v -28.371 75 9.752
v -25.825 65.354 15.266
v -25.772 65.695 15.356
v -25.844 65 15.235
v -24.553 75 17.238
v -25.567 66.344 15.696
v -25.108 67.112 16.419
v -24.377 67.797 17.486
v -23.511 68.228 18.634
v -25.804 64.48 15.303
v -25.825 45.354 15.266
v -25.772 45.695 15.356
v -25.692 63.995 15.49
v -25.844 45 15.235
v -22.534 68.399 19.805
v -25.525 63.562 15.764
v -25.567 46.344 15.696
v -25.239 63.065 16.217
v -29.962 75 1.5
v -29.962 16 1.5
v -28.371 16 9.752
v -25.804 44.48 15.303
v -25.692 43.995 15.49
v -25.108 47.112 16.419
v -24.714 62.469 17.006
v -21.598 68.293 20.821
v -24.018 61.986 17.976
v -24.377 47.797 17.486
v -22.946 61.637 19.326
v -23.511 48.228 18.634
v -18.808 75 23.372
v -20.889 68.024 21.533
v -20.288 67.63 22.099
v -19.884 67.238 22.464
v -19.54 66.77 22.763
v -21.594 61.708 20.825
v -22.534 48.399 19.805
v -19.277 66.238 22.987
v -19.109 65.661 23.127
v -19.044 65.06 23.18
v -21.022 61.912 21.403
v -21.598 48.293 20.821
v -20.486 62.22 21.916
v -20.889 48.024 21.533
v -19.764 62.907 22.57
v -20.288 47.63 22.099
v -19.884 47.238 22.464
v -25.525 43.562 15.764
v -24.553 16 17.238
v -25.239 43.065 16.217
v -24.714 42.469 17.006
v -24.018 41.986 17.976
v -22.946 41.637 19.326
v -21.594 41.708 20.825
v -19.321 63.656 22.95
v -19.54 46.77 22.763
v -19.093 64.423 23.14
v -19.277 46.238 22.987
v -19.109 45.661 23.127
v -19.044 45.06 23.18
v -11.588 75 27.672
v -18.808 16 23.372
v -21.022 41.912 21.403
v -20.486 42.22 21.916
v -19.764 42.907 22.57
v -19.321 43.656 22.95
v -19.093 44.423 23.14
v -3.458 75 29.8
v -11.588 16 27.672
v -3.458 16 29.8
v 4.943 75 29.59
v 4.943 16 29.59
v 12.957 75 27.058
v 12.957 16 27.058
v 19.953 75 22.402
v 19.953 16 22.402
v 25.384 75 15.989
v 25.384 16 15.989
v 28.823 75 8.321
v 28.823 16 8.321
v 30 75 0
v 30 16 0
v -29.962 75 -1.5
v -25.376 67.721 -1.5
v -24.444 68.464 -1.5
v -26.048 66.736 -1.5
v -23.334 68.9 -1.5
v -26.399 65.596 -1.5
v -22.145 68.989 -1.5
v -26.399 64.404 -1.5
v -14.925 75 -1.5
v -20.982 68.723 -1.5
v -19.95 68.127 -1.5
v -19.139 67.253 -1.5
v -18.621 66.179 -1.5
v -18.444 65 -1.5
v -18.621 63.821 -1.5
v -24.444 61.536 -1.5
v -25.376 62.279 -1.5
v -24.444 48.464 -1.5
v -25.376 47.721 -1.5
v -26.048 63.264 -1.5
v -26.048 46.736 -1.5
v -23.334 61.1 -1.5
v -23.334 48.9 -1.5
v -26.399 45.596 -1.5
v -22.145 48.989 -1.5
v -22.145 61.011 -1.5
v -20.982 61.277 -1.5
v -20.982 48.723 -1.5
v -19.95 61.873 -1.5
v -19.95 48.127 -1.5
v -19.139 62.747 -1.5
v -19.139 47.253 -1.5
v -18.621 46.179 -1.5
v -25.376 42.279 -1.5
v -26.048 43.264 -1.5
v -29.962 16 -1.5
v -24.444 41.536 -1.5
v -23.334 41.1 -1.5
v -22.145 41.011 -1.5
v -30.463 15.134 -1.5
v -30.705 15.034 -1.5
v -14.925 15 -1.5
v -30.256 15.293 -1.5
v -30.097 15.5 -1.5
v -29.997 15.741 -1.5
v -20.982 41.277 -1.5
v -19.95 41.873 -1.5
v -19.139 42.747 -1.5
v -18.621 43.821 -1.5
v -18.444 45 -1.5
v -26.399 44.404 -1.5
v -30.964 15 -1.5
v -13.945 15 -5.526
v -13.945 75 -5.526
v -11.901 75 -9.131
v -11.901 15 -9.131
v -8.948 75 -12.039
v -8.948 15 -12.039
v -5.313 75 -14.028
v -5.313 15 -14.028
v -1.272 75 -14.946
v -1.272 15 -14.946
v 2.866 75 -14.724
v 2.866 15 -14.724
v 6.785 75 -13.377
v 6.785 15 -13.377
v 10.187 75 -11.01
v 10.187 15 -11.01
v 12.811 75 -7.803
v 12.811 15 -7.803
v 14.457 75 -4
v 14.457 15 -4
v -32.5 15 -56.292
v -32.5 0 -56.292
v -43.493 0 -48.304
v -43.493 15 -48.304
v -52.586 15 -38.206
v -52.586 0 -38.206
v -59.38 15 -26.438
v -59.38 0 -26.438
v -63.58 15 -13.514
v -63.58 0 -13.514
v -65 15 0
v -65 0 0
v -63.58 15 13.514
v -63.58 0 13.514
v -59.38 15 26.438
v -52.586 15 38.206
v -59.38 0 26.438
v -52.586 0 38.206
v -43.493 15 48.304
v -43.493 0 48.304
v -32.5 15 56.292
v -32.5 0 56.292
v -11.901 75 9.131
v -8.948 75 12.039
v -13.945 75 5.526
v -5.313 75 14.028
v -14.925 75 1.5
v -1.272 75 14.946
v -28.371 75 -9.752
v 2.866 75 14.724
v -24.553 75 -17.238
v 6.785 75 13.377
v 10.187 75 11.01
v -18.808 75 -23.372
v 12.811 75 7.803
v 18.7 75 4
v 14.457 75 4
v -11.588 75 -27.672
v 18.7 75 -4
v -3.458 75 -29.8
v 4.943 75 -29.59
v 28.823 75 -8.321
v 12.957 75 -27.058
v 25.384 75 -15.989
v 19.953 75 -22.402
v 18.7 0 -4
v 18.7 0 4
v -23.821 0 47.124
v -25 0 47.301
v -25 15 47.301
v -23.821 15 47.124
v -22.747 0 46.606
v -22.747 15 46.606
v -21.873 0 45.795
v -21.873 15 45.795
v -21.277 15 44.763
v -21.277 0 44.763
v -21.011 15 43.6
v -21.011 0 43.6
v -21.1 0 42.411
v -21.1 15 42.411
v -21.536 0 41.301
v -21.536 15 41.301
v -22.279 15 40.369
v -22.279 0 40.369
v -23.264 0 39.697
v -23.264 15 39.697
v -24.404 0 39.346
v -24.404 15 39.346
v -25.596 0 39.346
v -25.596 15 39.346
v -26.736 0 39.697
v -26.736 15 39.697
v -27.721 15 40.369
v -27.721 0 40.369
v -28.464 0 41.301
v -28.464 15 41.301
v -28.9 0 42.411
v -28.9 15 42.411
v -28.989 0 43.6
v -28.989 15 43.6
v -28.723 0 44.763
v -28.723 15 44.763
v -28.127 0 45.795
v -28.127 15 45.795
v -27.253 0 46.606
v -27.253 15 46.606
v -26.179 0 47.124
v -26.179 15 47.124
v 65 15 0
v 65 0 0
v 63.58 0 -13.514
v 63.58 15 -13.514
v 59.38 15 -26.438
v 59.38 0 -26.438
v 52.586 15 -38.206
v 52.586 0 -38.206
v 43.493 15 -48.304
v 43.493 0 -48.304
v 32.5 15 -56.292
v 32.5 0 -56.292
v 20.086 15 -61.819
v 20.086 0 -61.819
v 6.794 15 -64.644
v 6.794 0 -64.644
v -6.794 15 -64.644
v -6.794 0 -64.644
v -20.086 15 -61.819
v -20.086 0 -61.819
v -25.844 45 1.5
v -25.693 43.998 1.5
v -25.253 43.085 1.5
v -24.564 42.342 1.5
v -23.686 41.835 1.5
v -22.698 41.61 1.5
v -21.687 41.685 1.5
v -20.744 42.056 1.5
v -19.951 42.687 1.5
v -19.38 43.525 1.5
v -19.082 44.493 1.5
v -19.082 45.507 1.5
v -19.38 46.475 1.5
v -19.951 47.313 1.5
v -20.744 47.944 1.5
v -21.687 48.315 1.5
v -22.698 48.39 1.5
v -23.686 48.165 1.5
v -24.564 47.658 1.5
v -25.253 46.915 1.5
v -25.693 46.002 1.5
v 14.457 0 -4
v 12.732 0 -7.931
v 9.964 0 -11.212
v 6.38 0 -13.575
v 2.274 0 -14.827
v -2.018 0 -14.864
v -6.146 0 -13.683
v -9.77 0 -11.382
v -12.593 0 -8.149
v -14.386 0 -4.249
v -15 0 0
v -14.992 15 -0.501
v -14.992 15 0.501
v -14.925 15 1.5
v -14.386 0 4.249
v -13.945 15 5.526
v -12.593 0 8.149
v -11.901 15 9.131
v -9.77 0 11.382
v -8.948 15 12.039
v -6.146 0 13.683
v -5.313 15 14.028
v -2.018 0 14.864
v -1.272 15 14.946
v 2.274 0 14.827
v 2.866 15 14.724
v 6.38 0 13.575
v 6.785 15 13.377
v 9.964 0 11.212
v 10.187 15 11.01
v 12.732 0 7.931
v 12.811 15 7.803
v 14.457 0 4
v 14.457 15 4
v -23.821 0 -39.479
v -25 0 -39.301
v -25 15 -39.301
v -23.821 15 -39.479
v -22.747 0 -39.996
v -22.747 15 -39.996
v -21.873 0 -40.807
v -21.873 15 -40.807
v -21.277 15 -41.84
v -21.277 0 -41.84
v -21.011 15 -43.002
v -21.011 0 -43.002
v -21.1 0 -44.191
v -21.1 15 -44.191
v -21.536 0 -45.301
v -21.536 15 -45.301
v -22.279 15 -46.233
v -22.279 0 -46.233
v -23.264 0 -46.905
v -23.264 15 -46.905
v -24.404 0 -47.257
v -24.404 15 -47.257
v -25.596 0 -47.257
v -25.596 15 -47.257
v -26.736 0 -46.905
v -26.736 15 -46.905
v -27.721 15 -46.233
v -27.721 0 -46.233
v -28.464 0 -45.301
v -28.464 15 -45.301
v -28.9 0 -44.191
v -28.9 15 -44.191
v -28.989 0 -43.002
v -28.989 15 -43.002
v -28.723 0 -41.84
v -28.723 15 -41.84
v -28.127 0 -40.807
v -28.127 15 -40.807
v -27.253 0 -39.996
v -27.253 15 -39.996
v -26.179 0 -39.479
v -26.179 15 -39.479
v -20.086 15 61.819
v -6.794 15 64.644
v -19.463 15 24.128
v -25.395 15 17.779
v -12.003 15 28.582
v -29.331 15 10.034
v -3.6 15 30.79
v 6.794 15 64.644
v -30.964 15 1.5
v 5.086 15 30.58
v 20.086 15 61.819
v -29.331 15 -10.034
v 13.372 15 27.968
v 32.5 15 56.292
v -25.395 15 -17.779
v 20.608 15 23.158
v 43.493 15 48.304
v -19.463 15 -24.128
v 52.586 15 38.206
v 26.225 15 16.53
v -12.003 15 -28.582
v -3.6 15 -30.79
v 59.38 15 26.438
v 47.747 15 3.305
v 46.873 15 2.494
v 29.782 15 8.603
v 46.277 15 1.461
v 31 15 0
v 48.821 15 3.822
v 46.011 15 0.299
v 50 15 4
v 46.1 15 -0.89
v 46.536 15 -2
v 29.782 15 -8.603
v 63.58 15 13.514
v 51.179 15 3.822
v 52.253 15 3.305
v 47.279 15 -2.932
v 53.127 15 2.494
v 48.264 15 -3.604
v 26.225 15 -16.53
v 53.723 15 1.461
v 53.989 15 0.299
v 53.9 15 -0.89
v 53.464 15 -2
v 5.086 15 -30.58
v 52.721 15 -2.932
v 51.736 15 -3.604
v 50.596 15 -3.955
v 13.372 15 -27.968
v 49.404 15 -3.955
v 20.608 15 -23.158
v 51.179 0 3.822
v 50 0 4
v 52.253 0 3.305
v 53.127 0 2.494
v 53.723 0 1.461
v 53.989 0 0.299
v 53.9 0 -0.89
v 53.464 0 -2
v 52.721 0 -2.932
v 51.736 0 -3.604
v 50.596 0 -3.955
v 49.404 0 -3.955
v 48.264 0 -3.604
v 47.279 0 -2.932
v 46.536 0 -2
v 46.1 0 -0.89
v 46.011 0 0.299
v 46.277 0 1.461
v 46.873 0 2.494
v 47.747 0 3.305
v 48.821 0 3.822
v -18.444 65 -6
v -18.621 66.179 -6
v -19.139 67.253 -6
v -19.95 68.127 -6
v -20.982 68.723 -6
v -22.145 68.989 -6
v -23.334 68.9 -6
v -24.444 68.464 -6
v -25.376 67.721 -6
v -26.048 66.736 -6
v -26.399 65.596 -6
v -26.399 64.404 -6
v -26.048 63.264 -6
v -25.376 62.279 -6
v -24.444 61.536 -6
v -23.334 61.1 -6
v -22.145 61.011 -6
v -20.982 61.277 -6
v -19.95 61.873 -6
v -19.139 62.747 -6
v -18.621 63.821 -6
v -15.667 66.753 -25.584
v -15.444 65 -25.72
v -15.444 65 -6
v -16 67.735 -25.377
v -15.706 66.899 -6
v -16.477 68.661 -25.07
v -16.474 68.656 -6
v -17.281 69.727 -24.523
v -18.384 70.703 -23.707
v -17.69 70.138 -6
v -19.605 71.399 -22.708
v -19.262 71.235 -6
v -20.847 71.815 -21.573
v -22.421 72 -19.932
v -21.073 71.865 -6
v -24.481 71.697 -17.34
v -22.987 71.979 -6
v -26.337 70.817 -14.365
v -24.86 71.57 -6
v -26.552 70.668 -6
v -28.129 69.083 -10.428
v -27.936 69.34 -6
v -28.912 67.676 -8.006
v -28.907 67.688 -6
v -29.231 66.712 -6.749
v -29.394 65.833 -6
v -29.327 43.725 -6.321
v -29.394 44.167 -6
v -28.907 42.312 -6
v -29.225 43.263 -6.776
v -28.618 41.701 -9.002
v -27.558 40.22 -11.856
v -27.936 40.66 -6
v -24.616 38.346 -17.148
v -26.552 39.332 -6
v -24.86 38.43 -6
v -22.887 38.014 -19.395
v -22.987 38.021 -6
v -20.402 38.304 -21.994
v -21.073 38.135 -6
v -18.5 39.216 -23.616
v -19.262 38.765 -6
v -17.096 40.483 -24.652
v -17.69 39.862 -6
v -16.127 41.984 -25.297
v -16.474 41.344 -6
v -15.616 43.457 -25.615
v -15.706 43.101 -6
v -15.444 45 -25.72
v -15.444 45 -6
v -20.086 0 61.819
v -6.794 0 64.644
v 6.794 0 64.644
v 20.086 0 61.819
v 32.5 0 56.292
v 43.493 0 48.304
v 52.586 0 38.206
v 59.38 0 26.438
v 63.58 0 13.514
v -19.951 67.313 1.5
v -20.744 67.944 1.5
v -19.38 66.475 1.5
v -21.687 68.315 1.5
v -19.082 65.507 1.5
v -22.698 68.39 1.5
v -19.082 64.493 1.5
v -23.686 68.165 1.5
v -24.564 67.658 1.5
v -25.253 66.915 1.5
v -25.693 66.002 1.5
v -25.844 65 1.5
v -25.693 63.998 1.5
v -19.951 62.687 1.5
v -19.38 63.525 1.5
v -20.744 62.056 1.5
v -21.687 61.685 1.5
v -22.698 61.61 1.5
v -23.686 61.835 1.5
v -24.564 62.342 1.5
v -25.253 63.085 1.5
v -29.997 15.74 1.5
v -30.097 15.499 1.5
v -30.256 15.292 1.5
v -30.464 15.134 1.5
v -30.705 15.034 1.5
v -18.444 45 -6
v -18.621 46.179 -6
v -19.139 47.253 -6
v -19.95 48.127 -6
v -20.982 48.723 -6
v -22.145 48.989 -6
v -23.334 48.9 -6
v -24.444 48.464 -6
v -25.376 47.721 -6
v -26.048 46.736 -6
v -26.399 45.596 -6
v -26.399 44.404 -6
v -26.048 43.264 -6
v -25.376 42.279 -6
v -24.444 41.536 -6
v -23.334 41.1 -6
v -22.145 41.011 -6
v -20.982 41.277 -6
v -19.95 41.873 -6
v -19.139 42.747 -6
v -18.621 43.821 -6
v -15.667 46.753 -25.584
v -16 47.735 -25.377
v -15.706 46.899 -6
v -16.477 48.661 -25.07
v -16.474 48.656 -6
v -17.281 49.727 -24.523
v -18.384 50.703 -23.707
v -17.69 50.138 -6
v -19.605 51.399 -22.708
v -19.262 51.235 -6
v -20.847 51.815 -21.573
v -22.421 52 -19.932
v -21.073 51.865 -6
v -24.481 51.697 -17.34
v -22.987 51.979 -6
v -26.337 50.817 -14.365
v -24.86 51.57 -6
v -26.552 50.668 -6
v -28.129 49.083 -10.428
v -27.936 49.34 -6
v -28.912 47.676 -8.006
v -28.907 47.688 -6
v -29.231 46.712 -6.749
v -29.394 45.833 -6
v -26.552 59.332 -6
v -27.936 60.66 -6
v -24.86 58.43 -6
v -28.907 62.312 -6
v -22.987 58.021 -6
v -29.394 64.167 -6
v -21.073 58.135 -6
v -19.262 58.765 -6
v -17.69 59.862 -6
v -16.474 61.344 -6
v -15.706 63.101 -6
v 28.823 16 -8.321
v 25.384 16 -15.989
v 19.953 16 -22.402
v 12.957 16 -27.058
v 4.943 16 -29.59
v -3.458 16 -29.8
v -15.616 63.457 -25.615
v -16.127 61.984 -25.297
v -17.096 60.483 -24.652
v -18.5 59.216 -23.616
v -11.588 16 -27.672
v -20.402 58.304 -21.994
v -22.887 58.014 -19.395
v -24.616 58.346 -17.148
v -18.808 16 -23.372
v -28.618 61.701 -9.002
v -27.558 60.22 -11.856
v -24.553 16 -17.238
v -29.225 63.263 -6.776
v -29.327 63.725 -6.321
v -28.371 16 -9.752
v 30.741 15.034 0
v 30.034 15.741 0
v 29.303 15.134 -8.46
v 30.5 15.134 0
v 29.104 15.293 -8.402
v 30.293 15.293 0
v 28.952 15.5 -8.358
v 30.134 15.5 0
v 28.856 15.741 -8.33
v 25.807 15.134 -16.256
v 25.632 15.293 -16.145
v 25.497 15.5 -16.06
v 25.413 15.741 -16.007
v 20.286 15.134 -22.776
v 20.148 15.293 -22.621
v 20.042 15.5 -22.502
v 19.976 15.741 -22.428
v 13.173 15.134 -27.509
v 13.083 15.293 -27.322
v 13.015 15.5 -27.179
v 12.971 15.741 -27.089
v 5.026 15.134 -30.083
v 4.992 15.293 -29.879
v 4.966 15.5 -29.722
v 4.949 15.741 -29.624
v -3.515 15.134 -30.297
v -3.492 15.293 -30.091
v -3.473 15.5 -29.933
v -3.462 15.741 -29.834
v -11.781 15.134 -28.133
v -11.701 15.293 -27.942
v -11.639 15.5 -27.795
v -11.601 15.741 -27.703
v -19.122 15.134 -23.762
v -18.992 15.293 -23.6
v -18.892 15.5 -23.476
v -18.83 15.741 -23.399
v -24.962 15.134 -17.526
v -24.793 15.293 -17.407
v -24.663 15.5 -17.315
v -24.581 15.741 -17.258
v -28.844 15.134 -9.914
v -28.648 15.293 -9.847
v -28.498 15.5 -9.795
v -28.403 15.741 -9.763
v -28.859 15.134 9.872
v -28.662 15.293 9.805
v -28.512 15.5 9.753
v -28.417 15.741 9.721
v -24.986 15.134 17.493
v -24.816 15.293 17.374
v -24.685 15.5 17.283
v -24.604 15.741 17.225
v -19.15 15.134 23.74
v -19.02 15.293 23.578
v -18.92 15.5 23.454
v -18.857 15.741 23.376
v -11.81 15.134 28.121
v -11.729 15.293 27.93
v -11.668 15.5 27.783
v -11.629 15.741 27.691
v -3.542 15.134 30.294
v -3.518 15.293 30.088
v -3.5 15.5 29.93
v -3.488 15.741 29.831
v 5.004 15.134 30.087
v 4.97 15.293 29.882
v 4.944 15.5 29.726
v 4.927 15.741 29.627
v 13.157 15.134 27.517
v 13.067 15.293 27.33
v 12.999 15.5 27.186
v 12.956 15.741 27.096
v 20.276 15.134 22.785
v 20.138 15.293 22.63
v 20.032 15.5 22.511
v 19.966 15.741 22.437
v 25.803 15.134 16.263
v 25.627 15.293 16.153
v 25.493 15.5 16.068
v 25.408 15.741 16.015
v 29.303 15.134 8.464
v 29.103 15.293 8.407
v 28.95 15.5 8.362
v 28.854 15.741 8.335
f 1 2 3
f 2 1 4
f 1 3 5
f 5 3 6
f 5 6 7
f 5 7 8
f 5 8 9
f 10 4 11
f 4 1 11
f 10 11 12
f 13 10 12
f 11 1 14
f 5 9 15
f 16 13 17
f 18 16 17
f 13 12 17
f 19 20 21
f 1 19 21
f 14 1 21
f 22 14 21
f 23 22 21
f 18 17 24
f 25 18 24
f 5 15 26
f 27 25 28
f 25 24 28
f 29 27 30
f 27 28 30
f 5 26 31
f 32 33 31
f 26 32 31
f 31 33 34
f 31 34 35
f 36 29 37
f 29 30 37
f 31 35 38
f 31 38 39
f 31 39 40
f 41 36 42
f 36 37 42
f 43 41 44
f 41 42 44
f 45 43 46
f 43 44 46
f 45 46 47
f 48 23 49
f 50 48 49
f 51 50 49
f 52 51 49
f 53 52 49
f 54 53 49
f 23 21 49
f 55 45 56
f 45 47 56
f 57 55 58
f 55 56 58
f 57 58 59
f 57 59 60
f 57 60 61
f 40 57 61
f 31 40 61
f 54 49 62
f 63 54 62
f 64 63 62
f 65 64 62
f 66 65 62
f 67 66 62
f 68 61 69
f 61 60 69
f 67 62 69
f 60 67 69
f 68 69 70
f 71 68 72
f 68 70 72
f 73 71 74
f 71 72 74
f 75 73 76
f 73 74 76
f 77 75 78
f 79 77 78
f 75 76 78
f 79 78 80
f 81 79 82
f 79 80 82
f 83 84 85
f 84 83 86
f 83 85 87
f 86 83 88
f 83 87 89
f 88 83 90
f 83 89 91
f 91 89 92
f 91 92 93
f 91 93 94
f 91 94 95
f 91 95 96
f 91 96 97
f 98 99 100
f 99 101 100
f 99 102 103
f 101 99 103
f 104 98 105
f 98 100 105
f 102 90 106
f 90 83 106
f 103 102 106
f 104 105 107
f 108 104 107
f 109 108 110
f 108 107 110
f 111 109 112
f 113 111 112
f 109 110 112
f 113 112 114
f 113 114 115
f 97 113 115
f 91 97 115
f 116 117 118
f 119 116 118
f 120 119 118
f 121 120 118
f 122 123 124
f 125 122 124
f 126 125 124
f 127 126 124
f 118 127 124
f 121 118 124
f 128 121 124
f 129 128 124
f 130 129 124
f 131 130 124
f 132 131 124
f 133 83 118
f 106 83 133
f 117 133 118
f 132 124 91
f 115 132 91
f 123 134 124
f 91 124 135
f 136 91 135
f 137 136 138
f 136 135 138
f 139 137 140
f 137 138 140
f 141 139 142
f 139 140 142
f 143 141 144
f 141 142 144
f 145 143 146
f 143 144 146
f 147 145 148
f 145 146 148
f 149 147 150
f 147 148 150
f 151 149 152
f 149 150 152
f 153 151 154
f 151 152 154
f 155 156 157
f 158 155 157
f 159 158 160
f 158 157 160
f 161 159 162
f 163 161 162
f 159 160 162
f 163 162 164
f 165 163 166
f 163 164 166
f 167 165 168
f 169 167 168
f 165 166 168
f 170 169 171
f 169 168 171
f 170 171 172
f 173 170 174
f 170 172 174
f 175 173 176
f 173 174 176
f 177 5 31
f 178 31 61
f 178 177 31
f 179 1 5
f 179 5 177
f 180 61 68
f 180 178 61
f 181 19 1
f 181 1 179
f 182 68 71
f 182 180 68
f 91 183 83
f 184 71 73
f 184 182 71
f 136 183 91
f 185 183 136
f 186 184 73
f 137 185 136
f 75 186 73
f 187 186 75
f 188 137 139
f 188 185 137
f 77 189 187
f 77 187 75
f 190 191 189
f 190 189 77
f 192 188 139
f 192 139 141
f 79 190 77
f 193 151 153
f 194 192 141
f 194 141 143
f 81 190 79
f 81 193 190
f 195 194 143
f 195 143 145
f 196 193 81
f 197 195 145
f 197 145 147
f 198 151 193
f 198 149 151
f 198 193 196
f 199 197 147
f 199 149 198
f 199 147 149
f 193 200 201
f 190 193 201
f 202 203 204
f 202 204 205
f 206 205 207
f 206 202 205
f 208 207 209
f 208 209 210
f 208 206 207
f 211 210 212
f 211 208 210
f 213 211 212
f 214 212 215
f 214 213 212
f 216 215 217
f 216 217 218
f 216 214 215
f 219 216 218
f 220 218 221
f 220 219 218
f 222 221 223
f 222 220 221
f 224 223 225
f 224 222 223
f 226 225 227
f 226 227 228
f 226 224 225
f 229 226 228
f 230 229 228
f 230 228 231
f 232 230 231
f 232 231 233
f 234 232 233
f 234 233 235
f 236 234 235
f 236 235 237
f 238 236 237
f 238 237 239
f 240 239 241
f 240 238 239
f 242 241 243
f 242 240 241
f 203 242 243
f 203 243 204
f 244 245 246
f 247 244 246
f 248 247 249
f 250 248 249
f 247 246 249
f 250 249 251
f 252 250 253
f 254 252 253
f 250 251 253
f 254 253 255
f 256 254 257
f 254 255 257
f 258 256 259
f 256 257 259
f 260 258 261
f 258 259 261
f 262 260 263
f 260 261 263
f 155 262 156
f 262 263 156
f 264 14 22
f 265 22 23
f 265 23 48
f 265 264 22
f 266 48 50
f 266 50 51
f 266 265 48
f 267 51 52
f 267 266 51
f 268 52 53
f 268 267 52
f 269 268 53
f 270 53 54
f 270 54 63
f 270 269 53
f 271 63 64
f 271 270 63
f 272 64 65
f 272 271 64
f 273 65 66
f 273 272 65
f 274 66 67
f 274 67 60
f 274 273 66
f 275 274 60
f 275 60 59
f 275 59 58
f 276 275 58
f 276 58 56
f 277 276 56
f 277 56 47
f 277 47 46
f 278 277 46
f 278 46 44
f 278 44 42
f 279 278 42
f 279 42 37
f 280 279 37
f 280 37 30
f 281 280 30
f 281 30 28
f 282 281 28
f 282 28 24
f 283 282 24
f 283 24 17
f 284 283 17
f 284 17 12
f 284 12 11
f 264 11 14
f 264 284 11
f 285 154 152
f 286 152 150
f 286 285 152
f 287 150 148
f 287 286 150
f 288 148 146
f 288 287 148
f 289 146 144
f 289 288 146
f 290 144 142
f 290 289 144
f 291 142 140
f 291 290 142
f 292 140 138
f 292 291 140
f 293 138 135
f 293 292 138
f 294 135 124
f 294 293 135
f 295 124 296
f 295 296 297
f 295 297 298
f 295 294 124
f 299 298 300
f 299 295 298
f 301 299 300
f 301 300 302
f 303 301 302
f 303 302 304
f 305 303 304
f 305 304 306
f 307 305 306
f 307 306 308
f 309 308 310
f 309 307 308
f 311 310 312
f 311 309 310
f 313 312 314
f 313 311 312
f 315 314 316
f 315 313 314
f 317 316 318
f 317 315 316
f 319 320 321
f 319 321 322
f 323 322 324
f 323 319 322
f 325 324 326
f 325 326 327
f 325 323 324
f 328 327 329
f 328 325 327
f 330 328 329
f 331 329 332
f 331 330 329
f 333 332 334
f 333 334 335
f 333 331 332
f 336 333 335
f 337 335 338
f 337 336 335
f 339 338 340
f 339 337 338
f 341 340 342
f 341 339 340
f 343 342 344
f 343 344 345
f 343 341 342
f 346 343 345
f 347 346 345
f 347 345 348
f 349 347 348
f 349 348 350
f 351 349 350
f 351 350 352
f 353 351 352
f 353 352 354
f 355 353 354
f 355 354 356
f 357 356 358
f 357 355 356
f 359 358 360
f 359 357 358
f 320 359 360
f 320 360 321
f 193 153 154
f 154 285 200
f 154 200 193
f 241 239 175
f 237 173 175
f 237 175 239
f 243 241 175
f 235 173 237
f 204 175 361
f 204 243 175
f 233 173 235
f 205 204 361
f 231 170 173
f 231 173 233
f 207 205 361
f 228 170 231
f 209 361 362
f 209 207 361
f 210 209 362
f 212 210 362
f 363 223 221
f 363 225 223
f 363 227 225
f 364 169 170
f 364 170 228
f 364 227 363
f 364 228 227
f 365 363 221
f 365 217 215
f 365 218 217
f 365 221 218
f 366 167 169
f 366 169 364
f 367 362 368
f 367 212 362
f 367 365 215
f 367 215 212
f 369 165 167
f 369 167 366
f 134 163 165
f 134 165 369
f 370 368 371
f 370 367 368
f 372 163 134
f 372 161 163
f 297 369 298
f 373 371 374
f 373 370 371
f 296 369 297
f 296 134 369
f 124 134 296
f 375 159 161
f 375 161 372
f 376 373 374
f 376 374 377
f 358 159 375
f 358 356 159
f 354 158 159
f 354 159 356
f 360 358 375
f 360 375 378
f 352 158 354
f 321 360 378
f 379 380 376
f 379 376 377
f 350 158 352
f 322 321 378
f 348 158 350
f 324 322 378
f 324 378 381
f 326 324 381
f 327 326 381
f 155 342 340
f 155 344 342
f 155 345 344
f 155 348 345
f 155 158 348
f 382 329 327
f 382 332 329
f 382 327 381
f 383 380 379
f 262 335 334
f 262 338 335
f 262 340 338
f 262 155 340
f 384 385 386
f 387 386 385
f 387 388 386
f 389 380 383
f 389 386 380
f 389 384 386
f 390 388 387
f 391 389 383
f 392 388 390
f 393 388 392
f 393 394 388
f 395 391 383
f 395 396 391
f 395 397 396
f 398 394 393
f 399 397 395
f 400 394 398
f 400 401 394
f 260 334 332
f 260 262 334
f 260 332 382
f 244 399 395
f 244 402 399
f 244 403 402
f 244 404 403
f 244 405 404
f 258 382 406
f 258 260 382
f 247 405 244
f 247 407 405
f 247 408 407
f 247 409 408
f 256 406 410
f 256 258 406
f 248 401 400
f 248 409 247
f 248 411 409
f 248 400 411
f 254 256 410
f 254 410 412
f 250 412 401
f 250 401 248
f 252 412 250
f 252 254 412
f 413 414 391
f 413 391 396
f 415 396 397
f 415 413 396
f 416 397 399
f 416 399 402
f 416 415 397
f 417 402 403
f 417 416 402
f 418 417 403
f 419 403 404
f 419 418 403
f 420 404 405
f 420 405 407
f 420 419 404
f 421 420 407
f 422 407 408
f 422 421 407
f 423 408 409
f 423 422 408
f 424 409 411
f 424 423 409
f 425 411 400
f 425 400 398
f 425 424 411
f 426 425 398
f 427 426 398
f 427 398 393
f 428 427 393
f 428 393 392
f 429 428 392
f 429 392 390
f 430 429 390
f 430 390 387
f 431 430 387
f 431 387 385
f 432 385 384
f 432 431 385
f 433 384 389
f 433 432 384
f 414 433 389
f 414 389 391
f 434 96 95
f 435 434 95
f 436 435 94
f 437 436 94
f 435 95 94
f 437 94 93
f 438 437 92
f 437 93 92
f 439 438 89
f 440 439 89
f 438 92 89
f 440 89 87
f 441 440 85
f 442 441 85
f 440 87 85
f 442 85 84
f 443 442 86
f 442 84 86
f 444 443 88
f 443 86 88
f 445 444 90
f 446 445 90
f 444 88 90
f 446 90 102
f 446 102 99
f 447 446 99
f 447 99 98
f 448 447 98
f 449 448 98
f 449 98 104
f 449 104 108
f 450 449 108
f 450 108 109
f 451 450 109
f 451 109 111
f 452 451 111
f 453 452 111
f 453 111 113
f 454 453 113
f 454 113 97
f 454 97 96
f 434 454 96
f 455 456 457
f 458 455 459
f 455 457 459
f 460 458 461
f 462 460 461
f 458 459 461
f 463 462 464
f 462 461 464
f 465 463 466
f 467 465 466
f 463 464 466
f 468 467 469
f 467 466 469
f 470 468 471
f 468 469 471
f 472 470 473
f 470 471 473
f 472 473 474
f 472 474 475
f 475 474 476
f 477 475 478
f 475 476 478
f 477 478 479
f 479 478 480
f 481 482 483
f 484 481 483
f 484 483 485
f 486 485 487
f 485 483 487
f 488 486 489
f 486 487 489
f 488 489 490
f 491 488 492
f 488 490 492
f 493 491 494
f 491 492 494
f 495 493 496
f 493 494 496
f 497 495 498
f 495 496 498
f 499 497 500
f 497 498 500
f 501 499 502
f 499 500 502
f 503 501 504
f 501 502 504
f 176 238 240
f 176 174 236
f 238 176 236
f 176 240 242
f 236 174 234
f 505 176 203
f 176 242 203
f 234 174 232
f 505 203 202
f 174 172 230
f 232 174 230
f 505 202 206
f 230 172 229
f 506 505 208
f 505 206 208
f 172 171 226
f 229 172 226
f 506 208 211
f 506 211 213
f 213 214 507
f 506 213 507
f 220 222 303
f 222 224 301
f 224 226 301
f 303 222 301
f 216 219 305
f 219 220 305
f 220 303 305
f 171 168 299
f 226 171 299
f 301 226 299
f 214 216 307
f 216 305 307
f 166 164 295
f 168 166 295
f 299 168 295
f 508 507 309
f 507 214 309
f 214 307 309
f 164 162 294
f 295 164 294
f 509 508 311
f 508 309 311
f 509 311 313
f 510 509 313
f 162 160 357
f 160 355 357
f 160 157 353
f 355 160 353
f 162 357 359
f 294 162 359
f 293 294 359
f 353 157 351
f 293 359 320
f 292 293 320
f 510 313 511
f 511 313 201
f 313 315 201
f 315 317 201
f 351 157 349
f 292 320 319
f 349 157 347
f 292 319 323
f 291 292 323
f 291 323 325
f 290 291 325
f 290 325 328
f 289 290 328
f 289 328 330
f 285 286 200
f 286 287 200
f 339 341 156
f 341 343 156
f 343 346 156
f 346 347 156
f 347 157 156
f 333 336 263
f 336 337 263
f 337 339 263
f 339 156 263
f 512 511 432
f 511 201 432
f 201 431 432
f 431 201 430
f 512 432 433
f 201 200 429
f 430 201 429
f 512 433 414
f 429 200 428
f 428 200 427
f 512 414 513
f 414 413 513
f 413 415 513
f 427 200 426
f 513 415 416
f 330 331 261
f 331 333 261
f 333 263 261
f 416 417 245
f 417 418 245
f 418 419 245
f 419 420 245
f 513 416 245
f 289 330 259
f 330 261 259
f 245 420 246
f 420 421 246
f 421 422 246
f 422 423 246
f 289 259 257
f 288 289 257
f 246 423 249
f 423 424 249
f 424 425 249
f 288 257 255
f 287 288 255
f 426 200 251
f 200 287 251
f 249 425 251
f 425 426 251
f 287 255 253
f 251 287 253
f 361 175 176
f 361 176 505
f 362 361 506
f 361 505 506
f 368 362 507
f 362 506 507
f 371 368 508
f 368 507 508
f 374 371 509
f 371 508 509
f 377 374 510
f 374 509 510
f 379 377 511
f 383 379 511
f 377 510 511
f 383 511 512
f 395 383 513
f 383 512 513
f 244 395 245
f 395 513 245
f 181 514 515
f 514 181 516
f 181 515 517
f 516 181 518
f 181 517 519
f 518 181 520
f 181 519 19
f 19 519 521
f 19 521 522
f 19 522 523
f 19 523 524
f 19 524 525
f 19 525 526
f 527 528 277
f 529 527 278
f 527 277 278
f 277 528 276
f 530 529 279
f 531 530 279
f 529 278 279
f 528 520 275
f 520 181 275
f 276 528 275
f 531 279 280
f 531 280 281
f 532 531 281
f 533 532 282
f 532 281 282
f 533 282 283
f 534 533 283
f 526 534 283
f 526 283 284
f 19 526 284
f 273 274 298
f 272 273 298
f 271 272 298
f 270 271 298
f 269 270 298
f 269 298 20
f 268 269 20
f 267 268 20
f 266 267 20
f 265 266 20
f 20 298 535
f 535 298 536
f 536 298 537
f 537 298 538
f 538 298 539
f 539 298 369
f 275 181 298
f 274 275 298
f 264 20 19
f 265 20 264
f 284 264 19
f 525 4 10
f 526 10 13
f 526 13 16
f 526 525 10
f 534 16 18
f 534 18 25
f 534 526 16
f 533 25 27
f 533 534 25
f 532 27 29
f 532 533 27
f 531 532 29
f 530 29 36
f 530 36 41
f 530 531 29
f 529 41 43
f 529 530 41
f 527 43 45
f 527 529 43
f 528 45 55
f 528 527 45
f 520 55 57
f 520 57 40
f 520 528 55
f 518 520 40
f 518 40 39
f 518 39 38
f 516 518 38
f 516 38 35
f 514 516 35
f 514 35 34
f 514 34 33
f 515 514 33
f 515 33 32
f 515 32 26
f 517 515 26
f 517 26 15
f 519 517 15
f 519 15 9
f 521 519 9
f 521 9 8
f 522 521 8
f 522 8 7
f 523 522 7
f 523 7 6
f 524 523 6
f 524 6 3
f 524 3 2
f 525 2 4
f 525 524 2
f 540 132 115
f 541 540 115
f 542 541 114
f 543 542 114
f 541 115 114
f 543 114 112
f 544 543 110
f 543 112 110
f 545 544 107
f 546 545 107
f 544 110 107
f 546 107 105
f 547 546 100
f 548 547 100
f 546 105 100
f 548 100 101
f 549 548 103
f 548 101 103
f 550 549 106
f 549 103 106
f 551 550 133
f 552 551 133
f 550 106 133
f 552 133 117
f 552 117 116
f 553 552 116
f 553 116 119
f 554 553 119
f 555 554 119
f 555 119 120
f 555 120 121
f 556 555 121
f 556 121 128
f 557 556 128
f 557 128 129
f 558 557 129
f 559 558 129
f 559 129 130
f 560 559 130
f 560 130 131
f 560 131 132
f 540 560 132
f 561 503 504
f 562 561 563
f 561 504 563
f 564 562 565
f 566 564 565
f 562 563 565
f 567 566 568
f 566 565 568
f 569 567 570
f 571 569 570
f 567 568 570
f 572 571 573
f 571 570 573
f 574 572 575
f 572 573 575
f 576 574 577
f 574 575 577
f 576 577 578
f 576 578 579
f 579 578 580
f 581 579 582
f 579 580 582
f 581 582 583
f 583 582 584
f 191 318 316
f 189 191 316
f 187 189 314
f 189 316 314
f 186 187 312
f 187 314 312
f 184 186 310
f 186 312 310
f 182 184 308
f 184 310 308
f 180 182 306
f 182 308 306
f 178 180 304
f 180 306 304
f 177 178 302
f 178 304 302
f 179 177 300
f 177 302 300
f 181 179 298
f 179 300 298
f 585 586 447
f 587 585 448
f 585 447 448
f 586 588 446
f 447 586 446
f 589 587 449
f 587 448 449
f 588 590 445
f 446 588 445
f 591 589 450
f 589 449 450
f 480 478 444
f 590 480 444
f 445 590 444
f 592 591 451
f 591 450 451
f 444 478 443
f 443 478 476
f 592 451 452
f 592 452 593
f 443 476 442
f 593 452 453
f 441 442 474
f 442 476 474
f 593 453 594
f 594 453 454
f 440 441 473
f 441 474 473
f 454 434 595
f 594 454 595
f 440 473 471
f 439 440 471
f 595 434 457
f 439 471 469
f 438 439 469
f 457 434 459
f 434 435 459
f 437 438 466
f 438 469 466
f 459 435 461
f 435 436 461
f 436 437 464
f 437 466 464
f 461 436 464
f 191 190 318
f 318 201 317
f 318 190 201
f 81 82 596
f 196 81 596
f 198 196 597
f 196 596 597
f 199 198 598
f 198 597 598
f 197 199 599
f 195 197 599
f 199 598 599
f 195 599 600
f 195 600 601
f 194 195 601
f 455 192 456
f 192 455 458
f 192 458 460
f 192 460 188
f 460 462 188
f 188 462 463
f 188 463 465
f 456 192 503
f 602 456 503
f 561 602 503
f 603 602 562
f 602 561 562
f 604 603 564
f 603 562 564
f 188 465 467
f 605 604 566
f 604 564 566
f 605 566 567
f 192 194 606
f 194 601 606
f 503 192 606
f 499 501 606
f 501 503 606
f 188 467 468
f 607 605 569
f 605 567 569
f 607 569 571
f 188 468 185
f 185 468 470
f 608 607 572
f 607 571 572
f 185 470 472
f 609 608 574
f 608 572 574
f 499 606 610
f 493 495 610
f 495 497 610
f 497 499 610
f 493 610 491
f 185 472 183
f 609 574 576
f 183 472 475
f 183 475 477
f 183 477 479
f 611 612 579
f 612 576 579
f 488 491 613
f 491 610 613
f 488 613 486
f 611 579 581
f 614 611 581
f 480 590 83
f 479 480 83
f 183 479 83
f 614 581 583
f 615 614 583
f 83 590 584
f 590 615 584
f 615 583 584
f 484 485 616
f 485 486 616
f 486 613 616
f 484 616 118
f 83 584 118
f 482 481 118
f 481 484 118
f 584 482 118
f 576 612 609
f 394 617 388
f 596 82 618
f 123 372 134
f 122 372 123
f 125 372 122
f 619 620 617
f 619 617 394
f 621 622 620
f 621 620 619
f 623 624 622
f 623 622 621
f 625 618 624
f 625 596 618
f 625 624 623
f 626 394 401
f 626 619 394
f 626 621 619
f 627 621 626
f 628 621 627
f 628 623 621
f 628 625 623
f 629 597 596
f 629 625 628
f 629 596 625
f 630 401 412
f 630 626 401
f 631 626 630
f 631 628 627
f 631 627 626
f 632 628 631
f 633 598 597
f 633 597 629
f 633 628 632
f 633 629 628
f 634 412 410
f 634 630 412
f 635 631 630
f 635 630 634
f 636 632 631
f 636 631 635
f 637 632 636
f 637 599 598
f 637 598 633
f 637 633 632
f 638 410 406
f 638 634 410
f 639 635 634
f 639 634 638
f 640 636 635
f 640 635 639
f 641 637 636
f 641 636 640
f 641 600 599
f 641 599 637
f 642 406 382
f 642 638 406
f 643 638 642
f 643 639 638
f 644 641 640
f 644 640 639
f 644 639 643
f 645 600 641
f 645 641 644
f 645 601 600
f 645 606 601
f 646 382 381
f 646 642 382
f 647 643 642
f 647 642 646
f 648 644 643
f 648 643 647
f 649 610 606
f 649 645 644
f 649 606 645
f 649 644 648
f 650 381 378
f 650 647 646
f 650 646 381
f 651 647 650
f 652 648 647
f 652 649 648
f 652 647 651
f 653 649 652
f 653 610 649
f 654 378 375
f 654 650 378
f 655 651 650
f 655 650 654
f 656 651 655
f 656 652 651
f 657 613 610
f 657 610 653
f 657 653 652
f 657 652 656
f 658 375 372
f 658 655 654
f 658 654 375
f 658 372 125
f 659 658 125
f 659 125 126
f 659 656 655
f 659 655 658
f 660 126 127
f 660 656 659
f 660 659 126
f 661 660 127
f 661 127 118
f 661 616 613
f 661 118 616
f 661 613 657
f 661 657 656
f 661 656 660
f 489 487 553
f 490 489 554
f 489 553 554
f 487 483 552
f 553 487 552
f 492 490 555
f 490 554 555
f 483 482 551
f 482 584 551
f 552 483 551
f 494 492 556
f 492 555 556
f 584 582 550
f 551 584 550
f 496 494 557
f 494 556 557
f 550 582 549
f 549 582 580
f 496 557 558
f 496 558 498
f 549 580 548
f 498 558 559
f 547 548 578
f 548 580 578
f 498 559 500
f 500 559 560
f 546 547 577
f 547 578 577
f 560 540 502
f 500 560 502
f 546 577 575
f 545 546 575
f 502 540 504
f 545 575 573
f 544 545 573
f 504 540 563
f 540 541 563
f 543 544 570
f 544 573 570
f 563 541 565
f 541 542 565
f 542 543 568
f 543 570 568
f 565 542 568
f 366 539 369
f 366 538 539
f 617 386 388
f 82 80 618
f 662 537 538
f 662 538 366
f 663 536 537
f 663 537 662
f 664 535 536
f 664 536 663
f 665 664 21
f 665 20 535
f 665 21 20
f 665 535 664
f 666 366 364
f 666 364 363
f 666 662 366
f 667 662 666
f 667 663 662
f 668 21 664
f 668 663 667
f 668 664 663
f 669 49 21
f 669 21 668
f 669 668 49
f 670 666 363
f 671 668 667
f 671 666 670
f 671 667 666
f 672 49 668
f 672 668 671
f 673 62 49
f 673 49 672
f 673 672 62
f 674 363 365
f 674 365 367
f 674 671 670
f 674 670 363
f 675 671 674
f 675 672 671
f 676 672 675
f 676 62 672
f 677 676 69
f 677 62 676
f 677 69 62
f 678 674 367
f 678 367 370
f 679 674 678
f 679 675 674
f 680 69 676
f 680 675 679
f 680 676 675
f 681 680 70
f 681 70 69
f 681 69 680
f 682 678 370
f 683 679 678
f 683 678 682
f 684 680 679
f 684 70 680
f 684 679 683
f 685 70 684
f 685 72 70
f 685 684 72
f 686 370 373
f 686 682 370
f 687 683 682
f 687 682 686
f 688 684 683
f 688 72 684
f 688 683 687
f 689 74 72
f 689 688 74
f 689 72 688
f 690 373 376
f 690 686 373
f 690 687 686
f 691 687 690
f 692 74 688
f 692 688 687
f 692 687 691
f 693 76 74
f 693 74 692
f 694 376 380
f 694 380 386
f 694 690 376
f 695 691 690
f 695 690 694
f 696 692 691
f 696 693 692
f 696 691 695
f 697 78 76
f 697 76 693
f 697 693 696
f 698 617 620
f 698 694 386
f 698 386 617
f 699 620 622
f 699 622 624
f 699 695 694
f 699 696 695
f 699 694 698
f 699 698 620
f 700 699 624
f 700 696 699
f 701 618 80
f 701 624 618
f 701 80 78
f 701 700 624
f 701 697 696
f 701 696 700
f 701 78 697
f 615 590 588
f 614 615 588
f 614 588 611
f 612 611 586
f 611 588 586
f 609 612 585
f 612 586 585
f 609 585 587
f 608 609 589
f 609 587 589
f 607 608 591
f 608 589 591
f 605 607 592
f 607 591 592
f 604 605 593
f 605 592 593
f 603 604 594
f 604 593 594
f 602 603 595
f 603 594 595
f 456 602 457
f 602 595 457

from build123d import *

# Parameters (mm, degrees)
SKETCH3_R           = 4
BOSS_EXTRUDE1_DEPTH = 15
BOSS_EXTRUDE2_DEPTH = 60
FILLET1_R           = 1
SKETCH6_R           = 3.4
CUT_EXTRUDE1_DEPTH  = 116.10446612
SKETCH7_R           = 4
CUT_EXTRUDE2_DEPTH  = 116.10446612
CUT_EXTRUDE3_START  = -6
SKETCH8_R           = 7
CUT_EXTRUDE3_DEPTH  = 110.10446612
BOSS_EXTRUDE3_DEPTH = 15


with BuildPart() as part:
    # Sketch3 → Boss-Extrude1 (new body)
    with BuildSketch(Plane(origin=(0, 0, 0), x_dir=(1, 0, 0), z_dir=(0, 1, 0))):
        with BuildLine():
            ThreePointArc((52.056720354, -14.858327678), (65, 0), (52.056720354, 14.858327678))
            ThreePointArc((52.056720354, 14.858327678), (15.768189382, 27.311305152), (-13.16067095, 52.511606103))
            ThreePointArc((-13.16067095, 52.511606103), (-32.5, 56.291651246), (-38.896049404, 37.653278425))
            ThreePointArc((-38.896049404, 37.653278425), (-31.536378763, 0), (-38.896049404, -37.653278425))
            ThreePointArc((-38.896049404, -37.653278425), (-32.5, -56.291651246), (-13.16067095, -52.511606103))
            ThreePointArc((-13.16067095, -52.511606103), (15.768189382, -27.311305152), (52.056720354, -14.858327678))
        make_face()
        with Locations(Location((-25, 43.301270189, 0), (0, 0, 270))):
            Circle(SKETCH3_R, mode=Mode.SUBTRACT)
        with Locations(Location((-25, -43.301270189, 0), (0, 0, 270))):
            Circle(SKETCH3_R, mode=Mode.SUBTRACT)
        with Locations(Location((50, 0, 0), (0, 0, 270))):
            Circle(SKETCH3_R, mode=Mode.SUBTRACT)
        with BuildLine():
            Line((18.7, 4), (14.456832295, 4))
            ThreePointArc((14.456832295, 4), (-15, 0), (14.456832295, -4))
            Line((14.456832295, -4), (18.7, -4))
            Line((18.7, -4), (18.7, 4))
        make_face(mode=Mode.SUBTRACT)
    extrude(amount=BOSS_EXTRUDE1_DEPTH)

    # Sketch4 → Boss-Extrude2 (add)
    with BuildSketch(Plane(origin=(0, 15, 0), x_dir=(1, 0, 0), z_dir=(0, 1, 0))):
        with BuildLine():
            Line((18.7, -4), (14.456832295, -4))
            ThreePointArc((14.456832295, -4), (-1.271711896, -14.945994408), (-14.924811557, -1.5))
            Line((-14.924811557, -1.5), (-29.962476533, -1.5))
            ThreePointArc((-29.962476533, -1.5), (0.750234632, -29.990617666), (30, 0))
            ThreePointArc((30, 0), (0.750234632, 29.990617666), (-29.962476533, 1.5))
            Line((-29.962476533, 1.5), (-14.924811557, 1.5))
            ThreePointArc((-14.924811557, 1.5), (-1.271711896, 14.945994408), (14.456832295, 4))
            Line((14.456832295, 4), (18.7, 4))
            Line((18.7, 4), (18.7, -4))
        make_face()
    extrude(amount=BOSS_EXTRUDE2_DEPTH)

    # Fillet1
    fillet1_edges = [part.edges().sort_by_distance(p)[0] for p in [
        (30, 15, 0),
    ]]
    fillet(fillet1_edges, radius=FILLET1_R)

    # Sketch6 → Cut-Extrude1 (cut, through all)
    with BuildSketch(Plane.XY):
        with Locations(Location((-22.443644045, 65, 0), (0, 0, 180))):
            Circle(SKETCH6_R)
        with Locations(Location((-22.443644045, 45, 0), (0, 0, 180))):
            Circle(SKETCH6_R)
    extrude(amount=CUT_EXTRUDE1_DEPTH, mode=Mode.SUBTRACT)

    # Sketch7 → Cut-Extrude2 (cut, through all)
    with BuildSketch(Plane.XY):
        with Locations((-22.443644045, 65)):
            Circle(SKETCH7_R)
        with Locations((-22.443644045, 45)):
            Circle(SKETCH7_R)
    extrude(amount=-CUT_EXTRUDE2_DEPTH, mode=Mode.SUBTRACT)

    # Sketch8 → Cut-Extrude3 (cut, through all)
    with BuildSketch(Plane.XY.offset(CUT_EXTRUDE3_START)):
        with Locations((-22.443644045, 65)):
            Circle(SKETCH8_R)
        with Locations((-22.443644045, 45)):
            Circle(SKETCH8_R)
    extrude(amount=-CUT_EXTRUDE3_DEPTH, mode=Mode.SUBTRACT)

    # Sketch9 → Boss-Extrude3 (add)
    with BuildSketch(Plane(origin=(0, 0, 0), x_dir=(1, 0, 0), z_dir=(0, 1, 0))):
        with BuildLine():
            ThreePointArc((-38.896049404, 37.653278425), (-39.187845088, 48.170053586), (-32.499996308, 56.291653378))
            ThreePointArc((-32.499996308, 56.291653378), (-65, 1.908e-06), (-32.499999613, -56.29165147))
            ThreePointArc((-32.499999613, -56.29165147), (-39.187845707, -48.170051781), (-38.896049404, -37.653278425))
            ThreePointArc((-38.896049404, -37.653278425), (-31.536378763, 0), (-38.896049404, 37.653278425))
        make_face()
        with BuildLine():
            ThreePointArc((52.056720354, 14.858327678), (61.310411251, 9.85264418), (65, 0))
            ThreePointArc((65, 0), (32.500001846, 56.29165018), (-32.499996308, 56.291653378))
            ThreePointArc((-32.499996308, 56.291653378), (-22.122563378, 58.022695341), (-13.16067095, 52.511606103))
            ThreePointArc((-13.16067095, 52.511606103), (15.768189382, 27.311305152), (52.056720354, 14.858327678))
        make_face()
        with BuildLine():
            ThreePointArc((-32.499999613, -56.29165147), (32.500000194, -56.291651134), (65, 0))
            ThreePointArc((65, 0), (61.310411251, -9.85264418), (52.056720354, -14.858327678))
            ThreePointArc((52.056720354, -14.858327678), (15.768189382, -27.311305152), (-13.16067095, -52.511606103))
            ThreePointArc((-13.16067095, -52.511606103), (-22.122565251, -58.022695707), (-32.499999613, -56.29165147))
        make_face()
    extrude(amount=BOSS_EXTRUDE3_DEPTH)


solid = part.part
